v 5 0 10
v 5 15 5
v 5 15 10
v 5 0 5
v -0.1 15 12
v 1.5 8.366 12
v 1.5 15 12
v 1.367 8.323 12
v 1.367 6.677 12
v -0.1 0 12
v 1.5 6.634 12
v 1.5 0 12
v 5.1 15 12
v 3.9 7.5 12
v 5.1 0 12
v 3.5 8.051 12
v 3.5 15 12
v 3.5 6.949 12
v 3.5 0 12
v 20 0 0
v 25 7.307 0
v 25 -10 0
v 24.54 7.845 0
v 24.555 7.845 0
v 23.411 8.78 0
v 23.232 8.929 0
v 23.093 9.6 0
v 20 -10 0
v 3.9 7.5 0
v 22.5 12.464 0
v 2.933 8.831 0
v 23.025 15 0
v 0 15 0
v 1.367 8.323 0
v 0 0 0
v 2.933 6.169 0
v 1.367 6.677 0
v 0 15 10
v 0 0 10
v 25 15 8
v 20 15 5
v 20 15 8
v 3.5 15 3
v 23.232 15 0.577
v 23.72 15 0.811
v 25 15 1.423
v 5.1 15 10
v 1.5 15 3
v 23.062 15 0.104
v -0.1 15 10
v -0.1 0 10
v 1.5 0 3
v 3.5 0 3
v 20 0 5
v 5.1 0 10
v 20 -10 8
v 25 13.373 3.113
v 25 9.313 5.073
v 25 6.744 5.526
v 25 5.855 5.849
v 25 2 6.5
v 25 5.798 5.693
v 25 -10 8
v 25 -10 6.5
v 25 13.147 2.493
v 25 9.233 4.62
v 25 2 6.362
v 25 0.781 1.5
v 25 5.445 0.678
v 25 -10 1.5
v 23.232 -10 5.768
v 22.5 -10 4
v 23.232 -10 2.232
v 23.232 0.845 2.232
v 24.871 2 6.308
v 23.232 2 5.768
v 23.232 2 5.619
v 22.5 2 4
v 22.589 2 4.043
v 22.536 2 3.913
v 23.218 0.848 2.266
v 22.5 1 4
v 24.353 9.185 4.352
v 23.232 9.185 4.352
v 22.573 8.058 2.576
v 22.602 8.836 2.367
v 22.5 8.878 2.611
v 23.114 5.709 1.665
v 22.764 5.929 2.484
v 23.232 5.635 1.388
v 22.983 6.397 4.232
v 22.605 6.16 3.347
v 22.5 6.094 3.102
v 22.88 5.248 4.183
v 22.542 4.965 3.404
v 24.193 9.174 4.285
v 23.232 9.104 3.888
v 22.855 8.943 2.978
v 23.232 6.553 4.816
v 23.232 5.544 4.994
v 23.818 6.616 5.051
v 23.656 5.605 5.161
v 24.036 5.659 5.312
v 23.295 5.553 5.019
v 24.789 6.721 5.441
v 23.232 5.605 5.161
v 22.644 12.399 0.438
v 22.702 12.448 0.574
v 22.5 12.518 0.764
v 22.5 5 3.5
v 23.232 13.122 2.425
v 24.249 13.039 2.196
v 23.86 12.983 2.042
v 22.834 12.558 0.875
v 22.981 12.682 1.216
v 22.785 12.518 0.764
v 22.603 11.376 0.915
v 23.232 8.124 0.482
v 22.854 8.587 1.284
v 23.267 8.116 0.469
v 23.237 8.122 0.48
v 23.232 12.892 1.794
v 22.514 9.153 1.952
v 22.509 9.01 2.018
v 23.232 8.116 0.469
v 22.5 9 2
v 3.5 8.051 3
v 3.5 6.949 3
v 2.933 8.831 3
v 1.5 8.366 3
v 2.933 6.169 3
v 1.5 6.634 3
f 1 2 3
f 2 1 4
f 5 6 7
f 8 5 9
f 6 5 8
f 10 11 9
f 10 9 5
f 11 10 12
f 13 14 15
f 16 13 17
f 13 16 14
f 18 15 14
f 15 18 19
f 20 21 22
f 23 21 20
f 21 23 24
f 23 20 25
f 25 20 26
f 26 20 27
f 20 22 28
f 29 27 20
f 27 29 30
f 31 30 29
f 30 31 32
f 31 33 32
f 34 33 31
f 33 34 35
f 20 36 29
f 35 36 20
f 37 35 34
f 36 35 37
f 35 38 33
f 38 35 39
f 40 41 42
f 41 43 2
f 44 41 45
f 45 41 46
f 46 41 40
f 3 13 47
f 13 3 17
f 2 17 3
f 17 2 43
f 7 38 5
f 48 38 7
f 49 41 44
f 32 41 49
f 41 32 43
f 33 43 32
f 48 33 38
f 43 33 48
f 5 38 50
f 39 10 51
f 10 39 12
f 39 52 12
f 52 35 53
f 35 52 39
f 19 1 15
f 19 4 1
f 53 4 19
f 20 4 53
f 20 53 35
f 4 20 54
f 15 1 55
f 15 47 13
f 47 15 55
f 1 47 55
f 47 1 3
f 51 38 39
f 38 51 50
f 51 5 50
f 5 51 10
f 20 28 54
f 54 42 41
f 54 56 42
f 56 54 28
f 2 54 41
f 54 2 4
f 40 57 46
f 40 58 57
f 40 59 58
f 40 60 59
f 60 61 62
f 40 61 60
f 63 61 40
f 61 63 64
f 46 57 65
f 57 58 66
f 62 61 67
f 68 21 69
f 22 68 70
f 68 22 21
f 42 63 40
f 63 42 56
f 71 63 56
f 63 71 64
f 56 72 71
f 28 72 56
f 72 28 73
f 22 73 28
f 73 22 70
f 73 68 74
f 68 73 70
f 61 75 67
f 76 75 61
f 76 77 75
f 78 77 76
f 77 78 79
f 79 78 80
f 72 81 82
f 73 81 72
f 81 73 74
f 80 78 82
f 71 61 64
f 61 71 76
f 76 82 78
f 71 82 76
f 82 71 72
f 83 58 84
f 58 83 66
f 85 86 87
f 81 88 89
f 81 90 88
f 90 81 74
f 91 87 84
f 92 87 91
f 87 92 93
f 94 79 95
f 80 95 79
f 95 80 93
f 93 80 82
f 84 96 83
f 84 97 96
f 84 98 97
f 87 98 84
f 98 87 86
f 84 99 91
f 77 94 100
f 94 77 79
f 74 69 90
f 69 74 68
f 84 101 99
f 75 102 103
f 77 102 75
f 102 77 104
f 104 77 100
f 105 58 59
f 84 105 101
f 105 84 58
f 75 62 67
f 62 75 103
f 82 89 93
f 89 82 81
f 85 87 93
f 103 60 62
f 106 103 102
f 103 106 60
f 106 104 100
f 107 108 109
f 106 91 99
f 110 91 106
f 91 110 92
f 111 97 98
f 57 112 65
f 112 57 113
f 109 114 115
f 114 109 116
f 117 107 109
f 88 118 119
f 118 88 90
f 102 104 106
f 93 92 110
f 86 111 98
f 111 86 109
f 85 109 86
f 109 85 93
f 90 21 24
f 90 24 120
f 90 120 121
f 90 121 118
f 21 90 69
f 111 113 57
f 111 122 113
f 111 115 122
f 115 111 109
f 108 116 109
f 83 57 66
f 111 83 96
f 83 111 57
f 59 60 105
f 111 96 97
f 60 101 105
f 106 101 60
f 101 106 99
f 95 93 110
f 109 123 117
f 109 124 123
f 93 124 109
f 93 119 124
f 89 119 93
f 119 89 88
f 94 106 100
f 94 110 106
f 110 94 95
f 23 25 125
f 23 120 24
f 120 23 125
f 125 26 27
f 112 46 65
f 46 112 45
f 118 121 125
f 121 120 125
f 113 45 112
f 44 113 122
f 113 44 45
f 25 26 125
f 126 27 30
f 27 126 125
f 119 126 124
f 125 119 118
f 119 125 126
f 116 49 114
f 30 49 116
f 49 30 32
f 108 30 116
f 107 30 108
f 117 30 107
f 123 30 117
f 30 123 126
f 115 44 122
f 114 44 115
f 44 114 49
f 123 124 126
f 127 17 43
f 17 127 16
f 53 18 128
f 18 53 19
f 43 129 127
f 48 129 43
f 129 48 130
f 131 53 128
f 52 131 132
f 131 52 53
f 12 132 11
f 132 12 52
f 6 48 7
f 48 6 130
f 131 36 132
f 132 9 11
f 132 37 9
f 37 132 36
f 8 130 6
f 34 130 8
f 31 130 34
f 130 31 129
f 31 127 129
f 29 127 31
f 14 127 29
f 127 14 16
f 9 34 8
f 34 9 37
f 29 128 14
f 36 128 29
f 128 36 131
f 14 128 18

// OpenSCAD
kano = 8;

difference(){
    union(){
        color("blue")cube([5,15,12]);
        translate([-0.1,0,10])color("blue")cube([5.2,15,2]);
        color("red")cube([20,15,5]);
        translate([20,-10])color("green")cube([5,25,kano]);
    
    }
    translate([1.5,0,3])cube([2,15,15]);
    translate([2.5,7.5])cylinder(d=2.8,h=15);
    translate([20,-10]){
        #translate([5,0,kano/2])rotate([-90,0,0])cylinder(d=5,h=12);
        #translate([5,11,kano/2])rotate([-100,0,0])cylinder(d=5,h=8);
        #translate([5,15,kano/2-0.5])rotate([-110,0,0])cylinder(d=5,h=8);
        #translate([5,19,kano/2-2])rotate([-120,0,0])cylinder(d=5,h=8);
    }
}
